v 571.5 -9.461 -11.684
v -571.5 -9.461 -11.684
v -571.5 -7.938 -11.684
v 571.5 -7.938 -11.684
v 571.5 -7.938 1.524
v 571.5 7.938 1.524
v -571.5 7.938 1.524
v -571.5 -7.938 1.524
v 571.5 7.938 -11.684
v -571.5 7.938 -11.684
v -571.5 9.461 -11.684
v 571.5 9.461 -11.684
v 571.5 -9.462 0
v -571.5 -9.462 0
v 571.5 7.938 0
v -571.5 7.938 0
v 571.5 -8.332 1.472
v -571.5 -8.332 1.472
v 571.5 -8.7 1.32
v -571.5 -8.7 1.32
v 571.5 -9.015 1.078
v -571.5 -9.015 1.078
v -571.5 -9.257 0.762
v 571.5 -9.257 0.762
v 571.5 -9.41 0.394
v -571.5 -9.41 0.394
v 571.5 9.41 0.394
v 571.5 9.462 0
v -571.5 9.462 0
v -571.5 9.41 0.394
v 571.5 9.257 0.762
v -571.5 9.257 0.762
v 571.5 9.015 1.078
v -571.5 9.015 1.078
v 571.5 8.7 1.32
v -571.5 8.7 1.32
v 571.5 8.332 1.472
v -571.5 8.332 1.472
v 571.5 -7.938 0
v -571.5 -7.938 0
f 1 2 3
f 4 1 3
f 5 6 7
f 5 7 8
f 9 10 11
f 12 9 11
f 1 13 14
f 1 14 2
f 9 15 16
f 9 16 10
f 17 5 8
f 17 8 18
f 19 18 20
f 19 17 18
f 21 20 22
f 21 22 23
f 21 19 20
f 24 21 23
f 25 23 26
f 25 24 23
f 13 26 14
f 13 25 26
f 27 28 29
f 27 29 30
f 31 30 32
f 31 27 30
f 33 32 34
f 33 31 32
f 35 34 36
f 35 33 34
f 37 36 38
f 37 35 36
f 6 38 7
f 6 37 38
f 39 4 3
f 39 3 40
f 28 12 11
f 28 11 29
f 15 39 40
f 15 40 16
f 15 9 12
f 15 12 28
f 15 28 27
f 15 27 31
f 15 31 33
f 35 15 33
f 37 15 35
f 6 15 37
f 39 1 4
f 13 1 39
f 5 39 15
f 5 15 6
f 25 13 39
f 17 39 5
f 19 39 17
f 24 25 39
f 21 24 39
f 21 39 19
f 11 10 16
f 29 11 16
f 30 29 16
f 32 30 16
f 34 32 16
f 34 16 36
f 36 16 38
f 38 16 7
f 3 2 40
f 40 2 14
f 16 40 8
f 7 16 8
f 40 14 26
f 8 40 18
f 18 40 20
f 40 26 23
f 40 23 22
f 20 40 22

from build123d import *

# Parameters (mm, degrees)
F1_DEPTH = 1270
F2_W     = 1143
F2_H     = 13.208
F3_DEPTH = 1270


with BuildPart() as f1:
    # F0 (on Right) → F1 (new body, symmetric)
    with BuildSketch(Plane.YZ):
        with BuildLine():
            ThreePointArc((-7.9375, 1.524), (-9.015131, 1.077631), (-9.4615, 0))
            Line((-9.4615, 0), (-9.4615, -11.684))
            Line((-9.4615, -11.684), (-7.9375, -11.684))
            Line((-7.9375, -11.684), (-7.9375, 0))
            Line((-7.9375, 0), (7.9375, 0))
            Line((7.9375, 0), (7.9375, -11.684))
            Line((7.9375, -11.684), (9.4615, -11.684))
            Line((9.4615, -11.684), (9.4615, 0))
            ThreePointArc((9.4615, 0), (9.015131, 1.077631), (7.9375, 1.524))
            Line((7.9375, 1.524), (-7.9375, 1.524))
        make_face()
    extrude(amount=F1_DEPTH, both=True)

    # F2 (on Front) → F3 (intersect, symmetric)
    with BuildSketch(Plane.XZ):
        with Locations((0, -5.08)):
            Rectangle(F2_W, F2_H)
    extrude(amount=F3_DEPTH, both=True, mode=Mode.INTERSECT)


solid = f1.part
